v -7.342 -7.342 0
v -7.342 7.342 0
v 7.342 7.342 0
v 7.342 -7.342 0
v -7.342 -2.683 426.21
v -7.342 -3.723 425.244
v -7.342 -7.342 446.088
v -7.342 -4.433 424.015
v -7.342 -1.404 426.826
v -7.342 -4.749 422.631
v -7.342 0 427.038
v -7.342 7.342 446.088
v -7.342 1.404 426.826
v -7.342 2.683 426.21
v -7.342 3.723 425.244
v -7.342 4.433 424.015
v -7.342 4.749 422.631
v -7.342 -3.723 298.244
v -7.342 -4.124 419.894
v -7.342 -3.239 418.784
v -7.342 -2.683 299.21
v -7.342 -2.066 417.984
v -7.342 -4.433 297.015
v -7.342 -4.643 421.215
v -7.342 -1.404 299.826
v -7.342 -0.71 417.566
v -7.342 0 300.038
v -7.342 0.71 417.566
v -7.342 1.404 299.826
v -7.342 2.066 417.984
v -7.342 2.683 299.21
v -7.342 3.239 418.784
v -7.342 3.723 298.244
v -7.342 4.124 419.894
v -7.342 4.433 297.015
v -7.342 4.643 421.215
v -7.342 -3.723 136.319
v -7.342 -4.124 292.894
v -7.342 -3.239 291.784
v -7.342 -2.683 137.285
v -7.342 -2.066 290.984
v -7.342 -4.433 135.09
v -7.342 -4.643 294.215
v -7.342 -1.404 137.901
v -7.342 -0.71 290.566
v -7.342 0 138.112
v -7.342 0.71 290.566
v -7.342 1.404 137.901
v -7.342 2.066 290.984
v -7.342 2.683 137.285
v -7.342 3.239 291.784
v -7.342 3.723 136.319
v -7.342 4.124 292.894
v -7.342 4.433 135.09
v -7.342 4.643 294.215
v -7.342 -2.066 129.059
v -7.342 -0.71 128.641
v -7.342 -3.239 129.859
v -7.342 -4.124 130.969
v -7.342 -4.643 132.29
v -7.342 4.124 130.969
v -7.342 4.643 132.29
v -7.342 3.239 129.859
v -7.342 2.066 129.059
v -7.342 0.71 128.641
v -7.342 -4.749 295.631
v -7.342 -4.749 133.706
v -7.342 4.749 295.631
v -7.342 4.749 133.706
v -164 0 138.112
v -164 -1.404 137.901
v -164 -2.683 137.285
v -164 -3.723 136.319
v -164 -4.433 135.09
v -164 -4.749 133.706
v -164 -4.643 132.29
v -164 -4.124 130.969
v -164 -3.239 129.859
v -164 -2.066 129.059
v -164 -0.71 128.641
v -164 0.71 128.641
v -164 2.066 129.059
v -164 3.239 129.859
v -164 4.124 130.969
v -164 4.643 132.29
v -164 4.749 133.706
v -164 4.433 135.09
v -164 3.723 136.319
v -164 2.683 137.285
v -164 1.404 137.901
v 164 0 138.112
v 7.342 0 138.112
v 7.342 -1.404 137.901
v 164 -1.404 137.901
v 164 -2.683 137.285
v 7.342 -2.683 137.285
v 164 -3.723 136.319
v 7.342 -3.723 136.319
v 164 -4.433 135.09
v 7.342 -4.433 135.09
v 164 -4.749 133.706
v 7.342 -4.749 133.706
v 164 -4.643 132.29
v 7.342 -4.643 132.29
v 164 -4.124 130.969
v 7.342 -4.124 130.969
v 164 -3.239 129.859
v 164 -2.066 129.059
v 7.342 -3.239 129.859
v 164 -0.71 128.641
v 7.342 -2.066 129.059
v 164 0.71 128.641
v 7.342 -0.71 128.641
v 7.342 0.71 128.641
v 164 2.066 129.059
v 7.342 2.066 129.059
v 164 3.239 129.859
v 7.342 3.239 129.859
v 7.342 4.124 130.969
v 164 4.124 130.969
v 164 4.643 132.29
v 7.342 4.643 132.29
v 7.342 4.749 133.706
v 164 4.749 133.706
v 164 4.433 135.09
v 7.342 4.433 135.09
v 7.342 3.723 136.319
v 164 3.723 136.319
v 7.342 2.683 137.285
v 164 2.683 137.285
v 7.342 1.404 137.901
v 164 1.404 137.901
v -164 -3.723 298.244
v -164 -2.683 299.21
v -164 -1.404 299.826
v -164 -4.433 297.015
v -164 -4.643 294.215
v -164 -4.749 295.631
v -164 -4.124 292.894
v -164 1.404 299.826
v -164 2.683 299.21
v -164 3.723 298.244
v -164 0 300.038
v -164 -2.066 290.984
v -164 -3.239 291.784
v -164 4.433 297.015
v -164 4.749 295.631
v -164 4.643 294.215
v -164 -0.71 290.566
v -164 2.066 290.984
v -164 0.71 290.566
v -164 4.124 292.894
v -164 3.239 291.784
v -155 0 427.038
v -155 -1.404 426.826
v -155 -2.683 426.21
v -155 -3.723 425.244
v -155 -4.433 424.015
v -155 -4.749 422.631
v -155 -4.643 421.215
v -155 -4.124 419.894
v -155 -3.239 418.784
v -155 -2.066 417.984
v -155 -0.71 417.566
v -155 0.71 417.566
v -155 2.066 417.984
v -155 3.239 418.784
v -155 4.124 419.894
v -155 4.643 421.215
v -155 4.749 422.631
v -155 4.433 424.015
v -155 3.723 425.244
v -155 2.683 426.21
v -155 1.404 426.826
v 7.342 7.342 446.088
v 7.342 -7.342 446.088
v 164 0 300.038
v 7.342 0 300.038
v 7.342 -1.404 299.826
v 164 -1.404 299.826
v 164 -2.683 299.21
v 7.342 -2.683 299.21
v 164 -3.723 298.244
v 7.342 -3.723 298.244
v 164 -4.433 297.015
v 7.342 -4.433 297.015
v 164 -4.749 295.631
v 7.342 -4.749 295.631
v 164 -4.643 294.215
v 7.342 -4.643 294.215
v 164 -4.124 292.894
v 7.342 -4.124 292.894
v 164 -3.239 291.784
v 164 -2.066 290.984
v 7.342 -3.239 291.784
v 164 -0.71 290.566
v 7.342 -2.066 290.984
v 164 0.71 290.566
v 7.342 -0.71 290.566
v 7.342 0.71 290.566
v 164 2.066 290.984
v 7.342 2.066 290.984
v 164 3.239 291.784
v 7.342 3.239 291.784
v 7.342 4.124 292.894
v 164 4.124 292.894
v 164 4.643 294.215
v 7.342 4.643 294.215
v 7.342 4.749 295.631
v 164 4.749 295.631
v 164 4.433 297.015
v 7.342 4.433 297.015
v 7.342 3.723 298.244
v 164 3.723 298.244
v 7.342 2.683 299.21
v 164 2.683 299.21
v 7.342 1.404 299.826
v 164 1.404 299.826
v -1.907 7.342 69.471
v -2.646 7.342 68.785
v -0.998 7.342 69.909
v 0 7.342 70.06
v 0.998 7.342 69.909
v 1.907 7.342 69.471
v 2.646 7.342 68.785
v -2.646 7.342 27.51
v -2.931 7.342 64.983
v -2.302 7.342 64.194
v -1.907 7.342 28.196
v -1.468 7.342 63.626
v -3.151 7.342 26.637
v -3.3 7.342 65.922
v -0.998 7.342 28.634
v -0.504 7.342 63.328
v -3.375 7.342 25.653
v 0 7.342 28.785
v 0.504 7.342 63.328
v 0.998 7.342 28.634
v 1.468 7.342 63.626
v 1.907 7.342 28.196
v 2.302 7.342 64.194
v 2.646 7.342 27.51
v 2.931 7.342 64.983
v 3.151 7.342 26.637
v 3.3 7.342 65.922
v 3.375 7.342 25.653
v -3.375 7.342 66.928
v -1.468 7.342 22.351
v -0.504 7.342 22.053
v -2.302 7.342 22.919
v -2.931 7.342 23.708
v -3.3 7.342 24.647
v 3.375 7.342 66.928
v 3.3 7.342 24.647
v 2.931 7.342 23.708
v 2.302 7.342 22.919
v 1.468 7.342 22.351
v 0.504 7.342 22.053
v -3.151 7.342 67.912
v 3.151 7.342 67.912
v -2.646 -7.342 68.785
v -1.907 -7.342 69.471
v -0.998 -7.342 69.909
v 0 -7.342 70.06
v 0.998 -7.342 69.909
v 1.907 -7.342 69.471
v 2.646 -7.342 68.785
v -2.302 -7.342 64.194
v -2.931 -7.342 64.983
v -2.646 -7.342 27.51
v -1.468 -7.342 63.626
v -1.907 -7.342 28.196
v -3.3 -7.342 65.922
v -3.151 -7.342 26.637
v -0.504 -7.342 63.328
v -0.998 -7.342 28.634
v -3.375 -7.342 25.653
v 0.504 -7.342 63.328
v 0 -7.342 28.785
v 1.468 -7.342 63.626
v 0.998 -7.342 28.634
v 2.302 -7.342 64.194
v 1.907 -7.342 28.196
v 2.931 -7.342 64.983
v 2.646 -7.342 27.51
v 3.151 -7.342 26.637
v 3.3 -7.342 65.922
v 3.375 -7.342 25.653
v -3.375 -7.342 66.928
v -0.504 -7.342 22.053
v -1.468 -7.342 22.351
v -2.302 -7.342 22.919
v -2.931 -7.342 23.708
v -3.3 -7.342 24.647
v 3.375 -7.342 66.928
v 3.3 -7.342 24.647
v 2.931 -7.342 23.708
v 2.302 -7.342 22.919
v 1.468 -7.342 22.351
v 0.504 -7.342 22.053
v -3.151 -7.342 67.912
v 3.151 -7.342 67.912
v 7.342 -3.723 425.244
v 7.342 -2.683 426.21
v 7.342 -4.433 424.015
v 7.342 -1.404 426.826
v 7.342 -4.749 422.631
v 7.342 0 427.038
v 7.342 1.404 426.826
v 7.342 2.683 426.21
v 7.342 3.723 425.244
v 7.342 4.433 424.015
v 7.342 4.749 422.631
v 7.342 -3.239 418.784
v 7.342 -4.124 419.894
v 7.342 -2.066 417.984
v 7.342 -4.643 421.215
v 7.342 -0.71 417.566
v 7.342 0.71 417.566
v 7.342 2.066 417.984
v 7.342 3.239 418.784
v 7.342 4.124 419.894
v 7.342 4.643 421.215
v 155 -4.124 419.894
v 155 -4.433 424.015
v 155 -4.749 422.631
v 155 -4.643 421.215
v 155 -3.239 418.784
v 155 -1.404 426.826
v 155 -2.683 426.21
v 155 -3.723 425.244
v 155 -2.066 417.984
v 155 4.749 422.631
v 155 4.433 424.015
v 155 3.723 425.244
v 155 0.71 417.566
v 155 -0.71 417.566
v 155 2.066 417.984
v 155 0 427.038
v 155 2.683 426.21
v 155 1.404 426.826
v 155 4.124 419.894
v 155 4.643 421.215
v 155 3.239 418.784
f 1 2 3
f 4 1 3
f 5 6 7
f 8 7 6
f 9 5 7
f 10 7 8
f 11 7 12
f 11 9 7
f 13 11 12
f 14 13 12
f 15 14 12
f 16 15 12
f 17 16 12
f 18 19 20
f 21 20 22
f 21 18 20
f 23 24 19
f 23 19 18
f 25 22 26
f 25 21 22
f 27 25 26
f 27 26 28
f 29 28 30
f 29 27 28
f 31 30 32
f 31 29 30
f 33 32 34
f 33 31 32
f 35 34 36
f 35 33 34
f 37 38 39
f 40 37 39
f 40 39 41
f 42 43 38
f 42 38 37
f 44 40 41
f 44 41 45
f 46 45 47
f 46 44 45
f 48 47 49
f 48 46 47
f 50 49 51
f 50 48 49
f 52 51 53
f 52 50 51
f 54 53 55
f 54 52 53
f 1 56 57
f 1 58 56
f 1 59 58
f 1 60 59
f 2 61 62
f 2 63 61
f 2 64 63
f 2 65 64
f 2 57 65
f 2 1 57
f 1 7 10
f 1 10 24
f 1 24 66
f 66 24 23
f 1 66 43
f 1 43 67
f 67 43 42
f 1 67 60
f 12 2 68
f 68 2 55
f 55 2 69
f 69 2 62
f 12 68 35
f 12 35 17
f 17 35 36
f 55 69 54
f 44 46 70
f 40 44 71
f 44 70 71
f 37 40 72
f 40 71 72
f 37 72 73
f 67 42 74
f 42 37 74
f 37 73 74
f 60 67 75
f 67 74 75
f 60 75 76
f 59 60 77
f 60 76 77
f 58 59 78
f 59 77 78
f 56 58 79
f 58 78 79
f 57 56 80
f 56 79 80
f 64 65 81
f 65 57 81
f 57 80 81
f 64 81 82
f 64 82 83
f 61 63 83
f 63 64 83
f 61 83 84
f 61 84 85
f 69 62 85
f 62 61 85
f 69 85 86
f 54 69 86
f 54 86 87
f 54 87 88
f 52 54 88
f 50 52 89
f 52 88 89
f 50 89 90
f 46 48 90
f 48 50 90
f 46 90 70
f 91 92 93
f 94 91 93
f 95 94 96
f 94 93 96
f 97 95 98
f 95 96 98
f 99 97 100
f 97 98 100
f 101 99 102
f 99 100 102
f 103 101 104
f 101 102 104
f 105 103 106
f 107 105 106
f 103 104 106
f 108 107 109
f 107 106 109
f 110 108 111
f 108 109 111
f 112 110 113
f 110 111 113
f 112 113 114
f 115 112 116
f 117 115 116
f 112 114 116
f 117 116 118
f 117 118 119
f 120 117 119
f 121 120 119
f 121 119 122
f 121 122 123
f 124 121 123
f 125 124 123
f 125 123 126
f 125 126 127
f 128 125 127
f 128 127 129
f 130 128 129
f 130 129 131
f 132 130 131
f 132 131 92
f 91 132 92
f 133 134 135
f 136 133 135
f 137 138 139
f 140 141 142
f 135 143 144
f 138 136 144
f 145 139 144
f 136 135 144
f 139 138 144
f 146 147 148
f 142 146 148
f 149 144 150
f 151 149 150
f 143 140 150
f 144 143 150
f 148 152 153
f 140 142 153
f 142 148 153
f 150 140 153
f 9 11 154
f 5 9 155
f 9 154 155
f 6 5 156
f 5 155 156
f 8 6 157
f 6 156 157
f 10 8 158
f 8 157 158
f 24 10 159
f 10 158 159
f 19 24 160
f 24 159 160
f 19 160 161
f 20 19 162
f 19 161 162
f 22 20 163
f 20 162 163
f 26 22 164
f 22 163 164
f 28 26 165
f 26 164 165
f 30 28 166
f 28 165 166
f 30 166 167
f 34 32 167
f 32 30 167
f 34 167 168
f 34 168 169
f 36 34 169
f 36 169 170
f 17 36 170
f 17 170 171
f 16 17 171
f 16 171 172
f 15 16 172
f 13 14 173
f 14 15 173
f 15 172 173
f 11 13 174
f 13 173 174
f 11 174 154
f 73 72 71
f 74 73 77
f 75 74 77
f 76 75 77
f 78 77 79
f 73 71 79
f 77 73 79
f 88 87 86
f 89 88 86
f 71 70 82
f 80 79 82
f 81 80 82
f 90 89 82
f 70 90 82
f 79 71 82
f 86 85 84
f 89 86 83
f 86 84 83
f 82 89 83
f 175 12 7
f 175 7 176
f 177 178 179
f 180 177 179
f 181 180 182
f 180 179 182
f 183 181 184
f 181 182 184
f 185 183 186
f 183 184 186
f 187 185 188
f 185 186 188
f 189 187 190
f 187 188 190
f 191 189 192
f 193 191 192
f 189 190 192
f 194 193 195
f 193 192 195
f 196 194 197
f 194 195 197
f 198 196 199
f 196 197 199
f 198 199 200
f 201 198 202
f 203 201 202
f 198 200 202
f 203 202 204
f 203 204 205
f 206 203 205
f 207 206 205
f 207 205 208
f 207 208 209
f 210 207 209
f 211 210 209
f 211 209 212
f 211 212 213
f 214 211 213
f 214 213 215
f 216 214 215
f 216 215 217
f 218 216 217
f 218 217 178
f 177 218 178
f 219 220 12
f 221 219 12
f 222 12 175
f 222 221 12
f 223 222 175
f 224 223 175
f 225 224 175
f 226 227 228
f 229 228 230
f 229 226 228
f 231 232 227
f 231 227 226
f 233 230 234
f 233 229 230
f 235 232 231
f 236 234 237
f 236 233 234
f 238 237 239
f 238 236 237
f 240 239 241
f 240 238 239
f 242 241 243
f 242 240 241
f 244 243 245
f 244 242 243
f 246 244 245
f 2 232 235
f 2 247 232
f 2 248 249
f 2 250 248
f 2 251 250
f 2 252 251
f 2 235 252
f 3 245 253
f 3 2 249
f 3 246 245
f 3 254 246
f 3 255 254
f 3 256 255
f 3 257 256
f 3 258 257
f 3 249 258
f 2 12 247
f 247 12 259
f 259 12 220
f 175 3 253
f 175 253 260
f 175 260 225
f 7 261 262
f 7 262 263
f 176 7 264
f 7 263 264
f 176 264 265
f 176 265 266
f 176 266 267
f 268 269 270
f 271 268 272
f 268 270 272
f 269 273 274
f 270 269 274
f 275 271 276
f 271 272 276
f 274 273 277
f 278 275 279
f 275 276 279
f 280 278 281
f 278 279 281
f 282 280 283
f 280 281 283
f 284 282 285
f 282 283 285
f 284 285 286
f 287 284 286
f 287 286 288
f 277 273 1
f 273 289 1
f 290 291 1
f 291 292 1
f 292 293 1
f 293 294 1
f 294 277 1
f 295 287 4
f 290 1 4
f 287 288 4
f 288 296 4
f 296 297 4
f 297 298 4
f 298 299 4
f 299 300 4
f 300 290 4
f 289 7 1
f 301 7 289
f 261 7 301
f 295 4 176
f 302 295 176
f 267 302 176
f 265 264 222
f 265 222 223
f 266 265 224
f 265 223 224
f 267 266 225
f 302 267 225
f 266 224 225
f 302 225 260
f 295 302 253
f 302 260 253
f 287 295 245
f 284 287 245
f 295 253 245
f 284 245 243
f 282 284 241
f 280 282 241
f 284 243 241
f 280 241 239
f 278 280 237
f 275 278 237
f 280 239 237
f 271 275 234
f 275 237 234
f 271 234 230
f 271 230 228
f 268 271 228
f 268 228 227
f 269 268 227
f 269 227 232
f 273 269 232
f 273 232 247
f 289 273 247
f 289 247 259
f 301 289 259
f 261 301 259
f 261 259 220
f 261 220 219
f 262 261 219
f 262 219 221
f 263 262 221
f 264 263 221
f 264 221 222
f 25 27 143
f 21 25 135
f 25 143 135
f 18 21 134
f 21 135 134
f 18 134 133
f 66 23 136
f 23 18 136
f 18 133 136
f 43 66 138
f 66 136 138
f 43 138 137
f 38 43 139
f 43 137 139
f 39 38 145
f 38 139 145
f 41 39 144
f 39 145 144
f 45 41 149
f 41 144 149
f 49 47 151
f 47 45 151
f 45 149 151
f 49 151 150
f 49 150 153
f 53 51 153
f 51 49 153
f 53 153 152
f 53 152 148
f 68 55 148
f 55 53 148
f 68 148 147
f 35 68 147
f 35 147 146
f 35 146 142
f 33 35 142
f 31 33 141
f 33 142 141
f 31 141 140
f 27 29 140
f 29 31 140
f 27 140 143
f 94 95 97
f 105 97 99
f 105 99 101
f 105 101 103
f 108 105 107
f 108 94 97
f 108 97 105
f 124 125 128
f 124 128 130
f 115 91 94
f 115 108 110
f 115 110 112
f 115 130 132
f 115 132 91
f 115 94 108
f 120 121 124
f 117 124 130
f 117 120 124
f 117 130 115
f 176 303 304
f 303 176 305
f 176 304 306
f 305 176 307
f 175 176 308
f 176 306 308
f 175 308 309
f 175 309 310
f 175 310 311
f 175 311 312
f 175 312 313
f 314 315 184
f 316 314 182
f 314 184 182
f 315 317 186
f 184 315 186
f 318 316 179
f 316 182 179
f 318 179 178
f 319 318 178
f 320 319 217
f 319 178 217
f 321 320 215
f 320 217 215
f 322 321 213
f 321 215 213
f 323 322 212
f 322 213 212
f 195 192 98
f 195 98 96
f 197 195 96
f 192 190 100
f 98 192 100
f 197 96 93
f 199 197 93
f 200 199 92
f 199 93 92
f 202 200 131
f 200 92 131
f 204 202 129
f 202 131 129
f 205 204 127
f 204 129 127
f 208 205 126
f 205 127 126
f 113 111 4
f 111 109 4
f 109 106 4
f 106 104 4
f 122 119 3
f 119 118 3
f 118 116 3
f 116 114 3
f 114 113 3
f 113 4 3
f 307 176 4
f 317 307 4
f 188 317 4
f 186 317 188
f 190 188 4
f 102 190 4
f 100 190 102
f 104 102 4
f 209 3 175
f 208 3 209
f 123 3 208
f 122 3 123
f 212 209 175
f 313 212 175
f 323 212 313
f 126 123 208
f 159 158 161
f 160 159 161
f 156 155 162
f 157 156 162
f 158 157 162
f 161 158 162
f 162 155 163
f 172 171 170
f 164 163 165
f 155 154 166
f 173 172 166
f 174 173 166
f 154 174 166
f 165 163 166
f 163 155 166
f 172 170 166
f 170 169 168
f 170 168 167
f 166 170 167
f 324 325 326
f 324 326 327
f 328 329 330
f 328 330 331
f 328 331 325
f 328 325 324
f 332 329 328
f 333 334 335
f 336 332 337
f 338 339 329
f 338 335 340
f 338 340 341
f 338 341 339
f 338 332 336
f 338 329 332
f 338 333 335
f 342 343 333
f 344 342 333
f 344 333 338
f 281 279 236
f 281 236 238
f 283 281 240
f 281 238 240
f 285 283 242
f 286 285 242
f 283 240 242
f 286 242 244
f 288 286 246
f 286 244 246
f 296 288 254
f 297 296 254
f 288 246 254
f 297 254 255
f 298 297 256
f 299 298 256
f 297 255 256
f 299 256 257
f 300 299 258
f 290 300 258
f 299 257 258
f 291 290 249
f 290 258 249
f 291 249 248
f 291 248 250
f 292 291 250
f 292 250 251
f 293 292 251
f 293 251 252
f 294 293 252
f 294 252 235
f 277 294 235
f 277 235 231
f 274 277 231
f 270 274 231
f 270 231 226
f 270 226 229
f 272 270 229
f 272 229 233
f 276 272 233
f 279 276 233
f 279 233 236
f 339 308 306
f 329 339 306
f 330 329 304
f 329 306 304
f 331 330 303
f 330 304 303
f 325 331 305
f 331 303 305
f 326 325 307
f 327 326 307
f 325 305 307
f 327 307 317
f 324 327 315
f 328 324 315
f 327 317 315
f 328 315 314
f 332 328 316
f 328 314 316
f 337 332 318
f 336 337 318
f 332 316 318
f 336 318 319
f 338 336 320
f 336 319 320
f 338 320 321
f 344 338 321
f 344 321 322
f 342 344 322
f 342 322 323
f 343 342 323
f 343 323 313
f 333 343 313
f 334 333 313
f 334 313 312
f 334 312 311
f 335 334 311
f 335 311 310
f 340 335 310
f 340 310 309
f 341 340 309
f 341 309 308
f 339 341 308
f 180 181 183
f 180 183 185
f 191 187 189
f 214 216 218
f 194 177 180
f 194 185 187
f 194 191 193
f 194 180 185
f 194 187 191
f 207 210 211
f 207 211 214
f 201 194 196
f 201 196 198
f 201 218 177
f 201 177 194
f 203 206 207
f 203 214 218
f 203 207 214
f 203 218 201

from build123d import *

# Parameters (mm, degrees)
SKETCH1_W                = 14.684375
SKETCH1_H                = 14.684375
BOSS_EXTRUDE1_DEPTH      = 446.0875
SKETCH9_R                = 3.384543224
CUT_EXTRUDE1_DEPTH       = 447.389511797
BOSS_EXTRUDE7_DEPTH      = 155
BOSS_EXTRUDE7_DEPTH_BACK = 155
SKETCH3_R                = 4.7625
BOSS_EXTRUDE8_DEPTH      = 164
BOSS_EXTRUDE8_DEPTH_BACK = 164
SKETCH3_3_R              = 4.7625
BOSS_EXTRUDE9_DEPTH      = 164
BOSS_EXTRUDE9_DEPTH_BACK = 164
SKETCH3_4_R              = 4.7625


with BuildPart() as part:
    # Sketch1 → Boss-Extrude1 (new body)
    with BuildSketch(Plane.XY):
        Rectangle(SKETCH1_W, SKETCH1_H)
    extrude(amount=BOSS_EXTRUDE1_DEPTH)

    # Sketch9 → Cut-Extrude1 (cut, through all)
    with BuildSketch(Plane(origin=(0, 7.3421875, 0), x_dir=(1, 0, 0), z_dir=(0, 1, 0))):
        with Locations((0, -25.4)):
            Circle(SKETCH9_R)
        with Locations((0, -66.675)):
            Circle(SKETCH9_R)
    extrude(amount=-CUT_EXTRUDE1_DEPTH, mode=Mode.SUBTRACT)

    # Sketch3 → Boss-Extrude7 (add, two sides: drawn at the far end of the back side and taken through both)
    with BuildSketch(Plane(origin=(0, 0, 0), x_dir=(0, 0, -1), z_dir=(1, 0, 0)).offset(-BOSS_EXTRUDE7_DEPTH_BACK)):
        with Locations((-422.275, 0)):
            Circle(SKETCH3_R)
    extrude(amount=BOSS_EXTRUDE7_DEPTH + BOSS_EXTRUDE7_DEPTH_BACK)

    # Sketch3<3> → Boss-Extrude8 (add, two sides: drawn at the far end of the back side and taken through both)
    with BuildSketch(Plane(origin=(0, 0, 0), x_dir=(0, 0, -1), z_dir=(1, 0, 0)).offset(-BOSS_EXTRUDE8_DEPTH_BACK)):
        with Locations((-133.35, 0)):
            Circle(SKETCH3_3_R)
    extrude(amount=BOSS_EXTRUDE8_DEPTH + BOSS_EXTRUDE8_DEPTH_BACK)

    # Sketch3<4> → Boss-Extrude9 (add, two sides: drawn at the far end of the back side and taken through both)
    with BuildSketch(Plane(origin=(0, 0, 0), x_dir=(0, 0, -1), z_dir=(1, 0, 0)).offset(-BOSS_EXTRUDE9_DEPTH_BACK)):
        with Locations((-295.275, 0)):
            Circle(SKETCH3_4_R)
    extrude(amount=BOSS_EXTRUDE9_DEPTH + BOSS_EXTRUDE9_DEPTH_BACK)


solid = part.part
